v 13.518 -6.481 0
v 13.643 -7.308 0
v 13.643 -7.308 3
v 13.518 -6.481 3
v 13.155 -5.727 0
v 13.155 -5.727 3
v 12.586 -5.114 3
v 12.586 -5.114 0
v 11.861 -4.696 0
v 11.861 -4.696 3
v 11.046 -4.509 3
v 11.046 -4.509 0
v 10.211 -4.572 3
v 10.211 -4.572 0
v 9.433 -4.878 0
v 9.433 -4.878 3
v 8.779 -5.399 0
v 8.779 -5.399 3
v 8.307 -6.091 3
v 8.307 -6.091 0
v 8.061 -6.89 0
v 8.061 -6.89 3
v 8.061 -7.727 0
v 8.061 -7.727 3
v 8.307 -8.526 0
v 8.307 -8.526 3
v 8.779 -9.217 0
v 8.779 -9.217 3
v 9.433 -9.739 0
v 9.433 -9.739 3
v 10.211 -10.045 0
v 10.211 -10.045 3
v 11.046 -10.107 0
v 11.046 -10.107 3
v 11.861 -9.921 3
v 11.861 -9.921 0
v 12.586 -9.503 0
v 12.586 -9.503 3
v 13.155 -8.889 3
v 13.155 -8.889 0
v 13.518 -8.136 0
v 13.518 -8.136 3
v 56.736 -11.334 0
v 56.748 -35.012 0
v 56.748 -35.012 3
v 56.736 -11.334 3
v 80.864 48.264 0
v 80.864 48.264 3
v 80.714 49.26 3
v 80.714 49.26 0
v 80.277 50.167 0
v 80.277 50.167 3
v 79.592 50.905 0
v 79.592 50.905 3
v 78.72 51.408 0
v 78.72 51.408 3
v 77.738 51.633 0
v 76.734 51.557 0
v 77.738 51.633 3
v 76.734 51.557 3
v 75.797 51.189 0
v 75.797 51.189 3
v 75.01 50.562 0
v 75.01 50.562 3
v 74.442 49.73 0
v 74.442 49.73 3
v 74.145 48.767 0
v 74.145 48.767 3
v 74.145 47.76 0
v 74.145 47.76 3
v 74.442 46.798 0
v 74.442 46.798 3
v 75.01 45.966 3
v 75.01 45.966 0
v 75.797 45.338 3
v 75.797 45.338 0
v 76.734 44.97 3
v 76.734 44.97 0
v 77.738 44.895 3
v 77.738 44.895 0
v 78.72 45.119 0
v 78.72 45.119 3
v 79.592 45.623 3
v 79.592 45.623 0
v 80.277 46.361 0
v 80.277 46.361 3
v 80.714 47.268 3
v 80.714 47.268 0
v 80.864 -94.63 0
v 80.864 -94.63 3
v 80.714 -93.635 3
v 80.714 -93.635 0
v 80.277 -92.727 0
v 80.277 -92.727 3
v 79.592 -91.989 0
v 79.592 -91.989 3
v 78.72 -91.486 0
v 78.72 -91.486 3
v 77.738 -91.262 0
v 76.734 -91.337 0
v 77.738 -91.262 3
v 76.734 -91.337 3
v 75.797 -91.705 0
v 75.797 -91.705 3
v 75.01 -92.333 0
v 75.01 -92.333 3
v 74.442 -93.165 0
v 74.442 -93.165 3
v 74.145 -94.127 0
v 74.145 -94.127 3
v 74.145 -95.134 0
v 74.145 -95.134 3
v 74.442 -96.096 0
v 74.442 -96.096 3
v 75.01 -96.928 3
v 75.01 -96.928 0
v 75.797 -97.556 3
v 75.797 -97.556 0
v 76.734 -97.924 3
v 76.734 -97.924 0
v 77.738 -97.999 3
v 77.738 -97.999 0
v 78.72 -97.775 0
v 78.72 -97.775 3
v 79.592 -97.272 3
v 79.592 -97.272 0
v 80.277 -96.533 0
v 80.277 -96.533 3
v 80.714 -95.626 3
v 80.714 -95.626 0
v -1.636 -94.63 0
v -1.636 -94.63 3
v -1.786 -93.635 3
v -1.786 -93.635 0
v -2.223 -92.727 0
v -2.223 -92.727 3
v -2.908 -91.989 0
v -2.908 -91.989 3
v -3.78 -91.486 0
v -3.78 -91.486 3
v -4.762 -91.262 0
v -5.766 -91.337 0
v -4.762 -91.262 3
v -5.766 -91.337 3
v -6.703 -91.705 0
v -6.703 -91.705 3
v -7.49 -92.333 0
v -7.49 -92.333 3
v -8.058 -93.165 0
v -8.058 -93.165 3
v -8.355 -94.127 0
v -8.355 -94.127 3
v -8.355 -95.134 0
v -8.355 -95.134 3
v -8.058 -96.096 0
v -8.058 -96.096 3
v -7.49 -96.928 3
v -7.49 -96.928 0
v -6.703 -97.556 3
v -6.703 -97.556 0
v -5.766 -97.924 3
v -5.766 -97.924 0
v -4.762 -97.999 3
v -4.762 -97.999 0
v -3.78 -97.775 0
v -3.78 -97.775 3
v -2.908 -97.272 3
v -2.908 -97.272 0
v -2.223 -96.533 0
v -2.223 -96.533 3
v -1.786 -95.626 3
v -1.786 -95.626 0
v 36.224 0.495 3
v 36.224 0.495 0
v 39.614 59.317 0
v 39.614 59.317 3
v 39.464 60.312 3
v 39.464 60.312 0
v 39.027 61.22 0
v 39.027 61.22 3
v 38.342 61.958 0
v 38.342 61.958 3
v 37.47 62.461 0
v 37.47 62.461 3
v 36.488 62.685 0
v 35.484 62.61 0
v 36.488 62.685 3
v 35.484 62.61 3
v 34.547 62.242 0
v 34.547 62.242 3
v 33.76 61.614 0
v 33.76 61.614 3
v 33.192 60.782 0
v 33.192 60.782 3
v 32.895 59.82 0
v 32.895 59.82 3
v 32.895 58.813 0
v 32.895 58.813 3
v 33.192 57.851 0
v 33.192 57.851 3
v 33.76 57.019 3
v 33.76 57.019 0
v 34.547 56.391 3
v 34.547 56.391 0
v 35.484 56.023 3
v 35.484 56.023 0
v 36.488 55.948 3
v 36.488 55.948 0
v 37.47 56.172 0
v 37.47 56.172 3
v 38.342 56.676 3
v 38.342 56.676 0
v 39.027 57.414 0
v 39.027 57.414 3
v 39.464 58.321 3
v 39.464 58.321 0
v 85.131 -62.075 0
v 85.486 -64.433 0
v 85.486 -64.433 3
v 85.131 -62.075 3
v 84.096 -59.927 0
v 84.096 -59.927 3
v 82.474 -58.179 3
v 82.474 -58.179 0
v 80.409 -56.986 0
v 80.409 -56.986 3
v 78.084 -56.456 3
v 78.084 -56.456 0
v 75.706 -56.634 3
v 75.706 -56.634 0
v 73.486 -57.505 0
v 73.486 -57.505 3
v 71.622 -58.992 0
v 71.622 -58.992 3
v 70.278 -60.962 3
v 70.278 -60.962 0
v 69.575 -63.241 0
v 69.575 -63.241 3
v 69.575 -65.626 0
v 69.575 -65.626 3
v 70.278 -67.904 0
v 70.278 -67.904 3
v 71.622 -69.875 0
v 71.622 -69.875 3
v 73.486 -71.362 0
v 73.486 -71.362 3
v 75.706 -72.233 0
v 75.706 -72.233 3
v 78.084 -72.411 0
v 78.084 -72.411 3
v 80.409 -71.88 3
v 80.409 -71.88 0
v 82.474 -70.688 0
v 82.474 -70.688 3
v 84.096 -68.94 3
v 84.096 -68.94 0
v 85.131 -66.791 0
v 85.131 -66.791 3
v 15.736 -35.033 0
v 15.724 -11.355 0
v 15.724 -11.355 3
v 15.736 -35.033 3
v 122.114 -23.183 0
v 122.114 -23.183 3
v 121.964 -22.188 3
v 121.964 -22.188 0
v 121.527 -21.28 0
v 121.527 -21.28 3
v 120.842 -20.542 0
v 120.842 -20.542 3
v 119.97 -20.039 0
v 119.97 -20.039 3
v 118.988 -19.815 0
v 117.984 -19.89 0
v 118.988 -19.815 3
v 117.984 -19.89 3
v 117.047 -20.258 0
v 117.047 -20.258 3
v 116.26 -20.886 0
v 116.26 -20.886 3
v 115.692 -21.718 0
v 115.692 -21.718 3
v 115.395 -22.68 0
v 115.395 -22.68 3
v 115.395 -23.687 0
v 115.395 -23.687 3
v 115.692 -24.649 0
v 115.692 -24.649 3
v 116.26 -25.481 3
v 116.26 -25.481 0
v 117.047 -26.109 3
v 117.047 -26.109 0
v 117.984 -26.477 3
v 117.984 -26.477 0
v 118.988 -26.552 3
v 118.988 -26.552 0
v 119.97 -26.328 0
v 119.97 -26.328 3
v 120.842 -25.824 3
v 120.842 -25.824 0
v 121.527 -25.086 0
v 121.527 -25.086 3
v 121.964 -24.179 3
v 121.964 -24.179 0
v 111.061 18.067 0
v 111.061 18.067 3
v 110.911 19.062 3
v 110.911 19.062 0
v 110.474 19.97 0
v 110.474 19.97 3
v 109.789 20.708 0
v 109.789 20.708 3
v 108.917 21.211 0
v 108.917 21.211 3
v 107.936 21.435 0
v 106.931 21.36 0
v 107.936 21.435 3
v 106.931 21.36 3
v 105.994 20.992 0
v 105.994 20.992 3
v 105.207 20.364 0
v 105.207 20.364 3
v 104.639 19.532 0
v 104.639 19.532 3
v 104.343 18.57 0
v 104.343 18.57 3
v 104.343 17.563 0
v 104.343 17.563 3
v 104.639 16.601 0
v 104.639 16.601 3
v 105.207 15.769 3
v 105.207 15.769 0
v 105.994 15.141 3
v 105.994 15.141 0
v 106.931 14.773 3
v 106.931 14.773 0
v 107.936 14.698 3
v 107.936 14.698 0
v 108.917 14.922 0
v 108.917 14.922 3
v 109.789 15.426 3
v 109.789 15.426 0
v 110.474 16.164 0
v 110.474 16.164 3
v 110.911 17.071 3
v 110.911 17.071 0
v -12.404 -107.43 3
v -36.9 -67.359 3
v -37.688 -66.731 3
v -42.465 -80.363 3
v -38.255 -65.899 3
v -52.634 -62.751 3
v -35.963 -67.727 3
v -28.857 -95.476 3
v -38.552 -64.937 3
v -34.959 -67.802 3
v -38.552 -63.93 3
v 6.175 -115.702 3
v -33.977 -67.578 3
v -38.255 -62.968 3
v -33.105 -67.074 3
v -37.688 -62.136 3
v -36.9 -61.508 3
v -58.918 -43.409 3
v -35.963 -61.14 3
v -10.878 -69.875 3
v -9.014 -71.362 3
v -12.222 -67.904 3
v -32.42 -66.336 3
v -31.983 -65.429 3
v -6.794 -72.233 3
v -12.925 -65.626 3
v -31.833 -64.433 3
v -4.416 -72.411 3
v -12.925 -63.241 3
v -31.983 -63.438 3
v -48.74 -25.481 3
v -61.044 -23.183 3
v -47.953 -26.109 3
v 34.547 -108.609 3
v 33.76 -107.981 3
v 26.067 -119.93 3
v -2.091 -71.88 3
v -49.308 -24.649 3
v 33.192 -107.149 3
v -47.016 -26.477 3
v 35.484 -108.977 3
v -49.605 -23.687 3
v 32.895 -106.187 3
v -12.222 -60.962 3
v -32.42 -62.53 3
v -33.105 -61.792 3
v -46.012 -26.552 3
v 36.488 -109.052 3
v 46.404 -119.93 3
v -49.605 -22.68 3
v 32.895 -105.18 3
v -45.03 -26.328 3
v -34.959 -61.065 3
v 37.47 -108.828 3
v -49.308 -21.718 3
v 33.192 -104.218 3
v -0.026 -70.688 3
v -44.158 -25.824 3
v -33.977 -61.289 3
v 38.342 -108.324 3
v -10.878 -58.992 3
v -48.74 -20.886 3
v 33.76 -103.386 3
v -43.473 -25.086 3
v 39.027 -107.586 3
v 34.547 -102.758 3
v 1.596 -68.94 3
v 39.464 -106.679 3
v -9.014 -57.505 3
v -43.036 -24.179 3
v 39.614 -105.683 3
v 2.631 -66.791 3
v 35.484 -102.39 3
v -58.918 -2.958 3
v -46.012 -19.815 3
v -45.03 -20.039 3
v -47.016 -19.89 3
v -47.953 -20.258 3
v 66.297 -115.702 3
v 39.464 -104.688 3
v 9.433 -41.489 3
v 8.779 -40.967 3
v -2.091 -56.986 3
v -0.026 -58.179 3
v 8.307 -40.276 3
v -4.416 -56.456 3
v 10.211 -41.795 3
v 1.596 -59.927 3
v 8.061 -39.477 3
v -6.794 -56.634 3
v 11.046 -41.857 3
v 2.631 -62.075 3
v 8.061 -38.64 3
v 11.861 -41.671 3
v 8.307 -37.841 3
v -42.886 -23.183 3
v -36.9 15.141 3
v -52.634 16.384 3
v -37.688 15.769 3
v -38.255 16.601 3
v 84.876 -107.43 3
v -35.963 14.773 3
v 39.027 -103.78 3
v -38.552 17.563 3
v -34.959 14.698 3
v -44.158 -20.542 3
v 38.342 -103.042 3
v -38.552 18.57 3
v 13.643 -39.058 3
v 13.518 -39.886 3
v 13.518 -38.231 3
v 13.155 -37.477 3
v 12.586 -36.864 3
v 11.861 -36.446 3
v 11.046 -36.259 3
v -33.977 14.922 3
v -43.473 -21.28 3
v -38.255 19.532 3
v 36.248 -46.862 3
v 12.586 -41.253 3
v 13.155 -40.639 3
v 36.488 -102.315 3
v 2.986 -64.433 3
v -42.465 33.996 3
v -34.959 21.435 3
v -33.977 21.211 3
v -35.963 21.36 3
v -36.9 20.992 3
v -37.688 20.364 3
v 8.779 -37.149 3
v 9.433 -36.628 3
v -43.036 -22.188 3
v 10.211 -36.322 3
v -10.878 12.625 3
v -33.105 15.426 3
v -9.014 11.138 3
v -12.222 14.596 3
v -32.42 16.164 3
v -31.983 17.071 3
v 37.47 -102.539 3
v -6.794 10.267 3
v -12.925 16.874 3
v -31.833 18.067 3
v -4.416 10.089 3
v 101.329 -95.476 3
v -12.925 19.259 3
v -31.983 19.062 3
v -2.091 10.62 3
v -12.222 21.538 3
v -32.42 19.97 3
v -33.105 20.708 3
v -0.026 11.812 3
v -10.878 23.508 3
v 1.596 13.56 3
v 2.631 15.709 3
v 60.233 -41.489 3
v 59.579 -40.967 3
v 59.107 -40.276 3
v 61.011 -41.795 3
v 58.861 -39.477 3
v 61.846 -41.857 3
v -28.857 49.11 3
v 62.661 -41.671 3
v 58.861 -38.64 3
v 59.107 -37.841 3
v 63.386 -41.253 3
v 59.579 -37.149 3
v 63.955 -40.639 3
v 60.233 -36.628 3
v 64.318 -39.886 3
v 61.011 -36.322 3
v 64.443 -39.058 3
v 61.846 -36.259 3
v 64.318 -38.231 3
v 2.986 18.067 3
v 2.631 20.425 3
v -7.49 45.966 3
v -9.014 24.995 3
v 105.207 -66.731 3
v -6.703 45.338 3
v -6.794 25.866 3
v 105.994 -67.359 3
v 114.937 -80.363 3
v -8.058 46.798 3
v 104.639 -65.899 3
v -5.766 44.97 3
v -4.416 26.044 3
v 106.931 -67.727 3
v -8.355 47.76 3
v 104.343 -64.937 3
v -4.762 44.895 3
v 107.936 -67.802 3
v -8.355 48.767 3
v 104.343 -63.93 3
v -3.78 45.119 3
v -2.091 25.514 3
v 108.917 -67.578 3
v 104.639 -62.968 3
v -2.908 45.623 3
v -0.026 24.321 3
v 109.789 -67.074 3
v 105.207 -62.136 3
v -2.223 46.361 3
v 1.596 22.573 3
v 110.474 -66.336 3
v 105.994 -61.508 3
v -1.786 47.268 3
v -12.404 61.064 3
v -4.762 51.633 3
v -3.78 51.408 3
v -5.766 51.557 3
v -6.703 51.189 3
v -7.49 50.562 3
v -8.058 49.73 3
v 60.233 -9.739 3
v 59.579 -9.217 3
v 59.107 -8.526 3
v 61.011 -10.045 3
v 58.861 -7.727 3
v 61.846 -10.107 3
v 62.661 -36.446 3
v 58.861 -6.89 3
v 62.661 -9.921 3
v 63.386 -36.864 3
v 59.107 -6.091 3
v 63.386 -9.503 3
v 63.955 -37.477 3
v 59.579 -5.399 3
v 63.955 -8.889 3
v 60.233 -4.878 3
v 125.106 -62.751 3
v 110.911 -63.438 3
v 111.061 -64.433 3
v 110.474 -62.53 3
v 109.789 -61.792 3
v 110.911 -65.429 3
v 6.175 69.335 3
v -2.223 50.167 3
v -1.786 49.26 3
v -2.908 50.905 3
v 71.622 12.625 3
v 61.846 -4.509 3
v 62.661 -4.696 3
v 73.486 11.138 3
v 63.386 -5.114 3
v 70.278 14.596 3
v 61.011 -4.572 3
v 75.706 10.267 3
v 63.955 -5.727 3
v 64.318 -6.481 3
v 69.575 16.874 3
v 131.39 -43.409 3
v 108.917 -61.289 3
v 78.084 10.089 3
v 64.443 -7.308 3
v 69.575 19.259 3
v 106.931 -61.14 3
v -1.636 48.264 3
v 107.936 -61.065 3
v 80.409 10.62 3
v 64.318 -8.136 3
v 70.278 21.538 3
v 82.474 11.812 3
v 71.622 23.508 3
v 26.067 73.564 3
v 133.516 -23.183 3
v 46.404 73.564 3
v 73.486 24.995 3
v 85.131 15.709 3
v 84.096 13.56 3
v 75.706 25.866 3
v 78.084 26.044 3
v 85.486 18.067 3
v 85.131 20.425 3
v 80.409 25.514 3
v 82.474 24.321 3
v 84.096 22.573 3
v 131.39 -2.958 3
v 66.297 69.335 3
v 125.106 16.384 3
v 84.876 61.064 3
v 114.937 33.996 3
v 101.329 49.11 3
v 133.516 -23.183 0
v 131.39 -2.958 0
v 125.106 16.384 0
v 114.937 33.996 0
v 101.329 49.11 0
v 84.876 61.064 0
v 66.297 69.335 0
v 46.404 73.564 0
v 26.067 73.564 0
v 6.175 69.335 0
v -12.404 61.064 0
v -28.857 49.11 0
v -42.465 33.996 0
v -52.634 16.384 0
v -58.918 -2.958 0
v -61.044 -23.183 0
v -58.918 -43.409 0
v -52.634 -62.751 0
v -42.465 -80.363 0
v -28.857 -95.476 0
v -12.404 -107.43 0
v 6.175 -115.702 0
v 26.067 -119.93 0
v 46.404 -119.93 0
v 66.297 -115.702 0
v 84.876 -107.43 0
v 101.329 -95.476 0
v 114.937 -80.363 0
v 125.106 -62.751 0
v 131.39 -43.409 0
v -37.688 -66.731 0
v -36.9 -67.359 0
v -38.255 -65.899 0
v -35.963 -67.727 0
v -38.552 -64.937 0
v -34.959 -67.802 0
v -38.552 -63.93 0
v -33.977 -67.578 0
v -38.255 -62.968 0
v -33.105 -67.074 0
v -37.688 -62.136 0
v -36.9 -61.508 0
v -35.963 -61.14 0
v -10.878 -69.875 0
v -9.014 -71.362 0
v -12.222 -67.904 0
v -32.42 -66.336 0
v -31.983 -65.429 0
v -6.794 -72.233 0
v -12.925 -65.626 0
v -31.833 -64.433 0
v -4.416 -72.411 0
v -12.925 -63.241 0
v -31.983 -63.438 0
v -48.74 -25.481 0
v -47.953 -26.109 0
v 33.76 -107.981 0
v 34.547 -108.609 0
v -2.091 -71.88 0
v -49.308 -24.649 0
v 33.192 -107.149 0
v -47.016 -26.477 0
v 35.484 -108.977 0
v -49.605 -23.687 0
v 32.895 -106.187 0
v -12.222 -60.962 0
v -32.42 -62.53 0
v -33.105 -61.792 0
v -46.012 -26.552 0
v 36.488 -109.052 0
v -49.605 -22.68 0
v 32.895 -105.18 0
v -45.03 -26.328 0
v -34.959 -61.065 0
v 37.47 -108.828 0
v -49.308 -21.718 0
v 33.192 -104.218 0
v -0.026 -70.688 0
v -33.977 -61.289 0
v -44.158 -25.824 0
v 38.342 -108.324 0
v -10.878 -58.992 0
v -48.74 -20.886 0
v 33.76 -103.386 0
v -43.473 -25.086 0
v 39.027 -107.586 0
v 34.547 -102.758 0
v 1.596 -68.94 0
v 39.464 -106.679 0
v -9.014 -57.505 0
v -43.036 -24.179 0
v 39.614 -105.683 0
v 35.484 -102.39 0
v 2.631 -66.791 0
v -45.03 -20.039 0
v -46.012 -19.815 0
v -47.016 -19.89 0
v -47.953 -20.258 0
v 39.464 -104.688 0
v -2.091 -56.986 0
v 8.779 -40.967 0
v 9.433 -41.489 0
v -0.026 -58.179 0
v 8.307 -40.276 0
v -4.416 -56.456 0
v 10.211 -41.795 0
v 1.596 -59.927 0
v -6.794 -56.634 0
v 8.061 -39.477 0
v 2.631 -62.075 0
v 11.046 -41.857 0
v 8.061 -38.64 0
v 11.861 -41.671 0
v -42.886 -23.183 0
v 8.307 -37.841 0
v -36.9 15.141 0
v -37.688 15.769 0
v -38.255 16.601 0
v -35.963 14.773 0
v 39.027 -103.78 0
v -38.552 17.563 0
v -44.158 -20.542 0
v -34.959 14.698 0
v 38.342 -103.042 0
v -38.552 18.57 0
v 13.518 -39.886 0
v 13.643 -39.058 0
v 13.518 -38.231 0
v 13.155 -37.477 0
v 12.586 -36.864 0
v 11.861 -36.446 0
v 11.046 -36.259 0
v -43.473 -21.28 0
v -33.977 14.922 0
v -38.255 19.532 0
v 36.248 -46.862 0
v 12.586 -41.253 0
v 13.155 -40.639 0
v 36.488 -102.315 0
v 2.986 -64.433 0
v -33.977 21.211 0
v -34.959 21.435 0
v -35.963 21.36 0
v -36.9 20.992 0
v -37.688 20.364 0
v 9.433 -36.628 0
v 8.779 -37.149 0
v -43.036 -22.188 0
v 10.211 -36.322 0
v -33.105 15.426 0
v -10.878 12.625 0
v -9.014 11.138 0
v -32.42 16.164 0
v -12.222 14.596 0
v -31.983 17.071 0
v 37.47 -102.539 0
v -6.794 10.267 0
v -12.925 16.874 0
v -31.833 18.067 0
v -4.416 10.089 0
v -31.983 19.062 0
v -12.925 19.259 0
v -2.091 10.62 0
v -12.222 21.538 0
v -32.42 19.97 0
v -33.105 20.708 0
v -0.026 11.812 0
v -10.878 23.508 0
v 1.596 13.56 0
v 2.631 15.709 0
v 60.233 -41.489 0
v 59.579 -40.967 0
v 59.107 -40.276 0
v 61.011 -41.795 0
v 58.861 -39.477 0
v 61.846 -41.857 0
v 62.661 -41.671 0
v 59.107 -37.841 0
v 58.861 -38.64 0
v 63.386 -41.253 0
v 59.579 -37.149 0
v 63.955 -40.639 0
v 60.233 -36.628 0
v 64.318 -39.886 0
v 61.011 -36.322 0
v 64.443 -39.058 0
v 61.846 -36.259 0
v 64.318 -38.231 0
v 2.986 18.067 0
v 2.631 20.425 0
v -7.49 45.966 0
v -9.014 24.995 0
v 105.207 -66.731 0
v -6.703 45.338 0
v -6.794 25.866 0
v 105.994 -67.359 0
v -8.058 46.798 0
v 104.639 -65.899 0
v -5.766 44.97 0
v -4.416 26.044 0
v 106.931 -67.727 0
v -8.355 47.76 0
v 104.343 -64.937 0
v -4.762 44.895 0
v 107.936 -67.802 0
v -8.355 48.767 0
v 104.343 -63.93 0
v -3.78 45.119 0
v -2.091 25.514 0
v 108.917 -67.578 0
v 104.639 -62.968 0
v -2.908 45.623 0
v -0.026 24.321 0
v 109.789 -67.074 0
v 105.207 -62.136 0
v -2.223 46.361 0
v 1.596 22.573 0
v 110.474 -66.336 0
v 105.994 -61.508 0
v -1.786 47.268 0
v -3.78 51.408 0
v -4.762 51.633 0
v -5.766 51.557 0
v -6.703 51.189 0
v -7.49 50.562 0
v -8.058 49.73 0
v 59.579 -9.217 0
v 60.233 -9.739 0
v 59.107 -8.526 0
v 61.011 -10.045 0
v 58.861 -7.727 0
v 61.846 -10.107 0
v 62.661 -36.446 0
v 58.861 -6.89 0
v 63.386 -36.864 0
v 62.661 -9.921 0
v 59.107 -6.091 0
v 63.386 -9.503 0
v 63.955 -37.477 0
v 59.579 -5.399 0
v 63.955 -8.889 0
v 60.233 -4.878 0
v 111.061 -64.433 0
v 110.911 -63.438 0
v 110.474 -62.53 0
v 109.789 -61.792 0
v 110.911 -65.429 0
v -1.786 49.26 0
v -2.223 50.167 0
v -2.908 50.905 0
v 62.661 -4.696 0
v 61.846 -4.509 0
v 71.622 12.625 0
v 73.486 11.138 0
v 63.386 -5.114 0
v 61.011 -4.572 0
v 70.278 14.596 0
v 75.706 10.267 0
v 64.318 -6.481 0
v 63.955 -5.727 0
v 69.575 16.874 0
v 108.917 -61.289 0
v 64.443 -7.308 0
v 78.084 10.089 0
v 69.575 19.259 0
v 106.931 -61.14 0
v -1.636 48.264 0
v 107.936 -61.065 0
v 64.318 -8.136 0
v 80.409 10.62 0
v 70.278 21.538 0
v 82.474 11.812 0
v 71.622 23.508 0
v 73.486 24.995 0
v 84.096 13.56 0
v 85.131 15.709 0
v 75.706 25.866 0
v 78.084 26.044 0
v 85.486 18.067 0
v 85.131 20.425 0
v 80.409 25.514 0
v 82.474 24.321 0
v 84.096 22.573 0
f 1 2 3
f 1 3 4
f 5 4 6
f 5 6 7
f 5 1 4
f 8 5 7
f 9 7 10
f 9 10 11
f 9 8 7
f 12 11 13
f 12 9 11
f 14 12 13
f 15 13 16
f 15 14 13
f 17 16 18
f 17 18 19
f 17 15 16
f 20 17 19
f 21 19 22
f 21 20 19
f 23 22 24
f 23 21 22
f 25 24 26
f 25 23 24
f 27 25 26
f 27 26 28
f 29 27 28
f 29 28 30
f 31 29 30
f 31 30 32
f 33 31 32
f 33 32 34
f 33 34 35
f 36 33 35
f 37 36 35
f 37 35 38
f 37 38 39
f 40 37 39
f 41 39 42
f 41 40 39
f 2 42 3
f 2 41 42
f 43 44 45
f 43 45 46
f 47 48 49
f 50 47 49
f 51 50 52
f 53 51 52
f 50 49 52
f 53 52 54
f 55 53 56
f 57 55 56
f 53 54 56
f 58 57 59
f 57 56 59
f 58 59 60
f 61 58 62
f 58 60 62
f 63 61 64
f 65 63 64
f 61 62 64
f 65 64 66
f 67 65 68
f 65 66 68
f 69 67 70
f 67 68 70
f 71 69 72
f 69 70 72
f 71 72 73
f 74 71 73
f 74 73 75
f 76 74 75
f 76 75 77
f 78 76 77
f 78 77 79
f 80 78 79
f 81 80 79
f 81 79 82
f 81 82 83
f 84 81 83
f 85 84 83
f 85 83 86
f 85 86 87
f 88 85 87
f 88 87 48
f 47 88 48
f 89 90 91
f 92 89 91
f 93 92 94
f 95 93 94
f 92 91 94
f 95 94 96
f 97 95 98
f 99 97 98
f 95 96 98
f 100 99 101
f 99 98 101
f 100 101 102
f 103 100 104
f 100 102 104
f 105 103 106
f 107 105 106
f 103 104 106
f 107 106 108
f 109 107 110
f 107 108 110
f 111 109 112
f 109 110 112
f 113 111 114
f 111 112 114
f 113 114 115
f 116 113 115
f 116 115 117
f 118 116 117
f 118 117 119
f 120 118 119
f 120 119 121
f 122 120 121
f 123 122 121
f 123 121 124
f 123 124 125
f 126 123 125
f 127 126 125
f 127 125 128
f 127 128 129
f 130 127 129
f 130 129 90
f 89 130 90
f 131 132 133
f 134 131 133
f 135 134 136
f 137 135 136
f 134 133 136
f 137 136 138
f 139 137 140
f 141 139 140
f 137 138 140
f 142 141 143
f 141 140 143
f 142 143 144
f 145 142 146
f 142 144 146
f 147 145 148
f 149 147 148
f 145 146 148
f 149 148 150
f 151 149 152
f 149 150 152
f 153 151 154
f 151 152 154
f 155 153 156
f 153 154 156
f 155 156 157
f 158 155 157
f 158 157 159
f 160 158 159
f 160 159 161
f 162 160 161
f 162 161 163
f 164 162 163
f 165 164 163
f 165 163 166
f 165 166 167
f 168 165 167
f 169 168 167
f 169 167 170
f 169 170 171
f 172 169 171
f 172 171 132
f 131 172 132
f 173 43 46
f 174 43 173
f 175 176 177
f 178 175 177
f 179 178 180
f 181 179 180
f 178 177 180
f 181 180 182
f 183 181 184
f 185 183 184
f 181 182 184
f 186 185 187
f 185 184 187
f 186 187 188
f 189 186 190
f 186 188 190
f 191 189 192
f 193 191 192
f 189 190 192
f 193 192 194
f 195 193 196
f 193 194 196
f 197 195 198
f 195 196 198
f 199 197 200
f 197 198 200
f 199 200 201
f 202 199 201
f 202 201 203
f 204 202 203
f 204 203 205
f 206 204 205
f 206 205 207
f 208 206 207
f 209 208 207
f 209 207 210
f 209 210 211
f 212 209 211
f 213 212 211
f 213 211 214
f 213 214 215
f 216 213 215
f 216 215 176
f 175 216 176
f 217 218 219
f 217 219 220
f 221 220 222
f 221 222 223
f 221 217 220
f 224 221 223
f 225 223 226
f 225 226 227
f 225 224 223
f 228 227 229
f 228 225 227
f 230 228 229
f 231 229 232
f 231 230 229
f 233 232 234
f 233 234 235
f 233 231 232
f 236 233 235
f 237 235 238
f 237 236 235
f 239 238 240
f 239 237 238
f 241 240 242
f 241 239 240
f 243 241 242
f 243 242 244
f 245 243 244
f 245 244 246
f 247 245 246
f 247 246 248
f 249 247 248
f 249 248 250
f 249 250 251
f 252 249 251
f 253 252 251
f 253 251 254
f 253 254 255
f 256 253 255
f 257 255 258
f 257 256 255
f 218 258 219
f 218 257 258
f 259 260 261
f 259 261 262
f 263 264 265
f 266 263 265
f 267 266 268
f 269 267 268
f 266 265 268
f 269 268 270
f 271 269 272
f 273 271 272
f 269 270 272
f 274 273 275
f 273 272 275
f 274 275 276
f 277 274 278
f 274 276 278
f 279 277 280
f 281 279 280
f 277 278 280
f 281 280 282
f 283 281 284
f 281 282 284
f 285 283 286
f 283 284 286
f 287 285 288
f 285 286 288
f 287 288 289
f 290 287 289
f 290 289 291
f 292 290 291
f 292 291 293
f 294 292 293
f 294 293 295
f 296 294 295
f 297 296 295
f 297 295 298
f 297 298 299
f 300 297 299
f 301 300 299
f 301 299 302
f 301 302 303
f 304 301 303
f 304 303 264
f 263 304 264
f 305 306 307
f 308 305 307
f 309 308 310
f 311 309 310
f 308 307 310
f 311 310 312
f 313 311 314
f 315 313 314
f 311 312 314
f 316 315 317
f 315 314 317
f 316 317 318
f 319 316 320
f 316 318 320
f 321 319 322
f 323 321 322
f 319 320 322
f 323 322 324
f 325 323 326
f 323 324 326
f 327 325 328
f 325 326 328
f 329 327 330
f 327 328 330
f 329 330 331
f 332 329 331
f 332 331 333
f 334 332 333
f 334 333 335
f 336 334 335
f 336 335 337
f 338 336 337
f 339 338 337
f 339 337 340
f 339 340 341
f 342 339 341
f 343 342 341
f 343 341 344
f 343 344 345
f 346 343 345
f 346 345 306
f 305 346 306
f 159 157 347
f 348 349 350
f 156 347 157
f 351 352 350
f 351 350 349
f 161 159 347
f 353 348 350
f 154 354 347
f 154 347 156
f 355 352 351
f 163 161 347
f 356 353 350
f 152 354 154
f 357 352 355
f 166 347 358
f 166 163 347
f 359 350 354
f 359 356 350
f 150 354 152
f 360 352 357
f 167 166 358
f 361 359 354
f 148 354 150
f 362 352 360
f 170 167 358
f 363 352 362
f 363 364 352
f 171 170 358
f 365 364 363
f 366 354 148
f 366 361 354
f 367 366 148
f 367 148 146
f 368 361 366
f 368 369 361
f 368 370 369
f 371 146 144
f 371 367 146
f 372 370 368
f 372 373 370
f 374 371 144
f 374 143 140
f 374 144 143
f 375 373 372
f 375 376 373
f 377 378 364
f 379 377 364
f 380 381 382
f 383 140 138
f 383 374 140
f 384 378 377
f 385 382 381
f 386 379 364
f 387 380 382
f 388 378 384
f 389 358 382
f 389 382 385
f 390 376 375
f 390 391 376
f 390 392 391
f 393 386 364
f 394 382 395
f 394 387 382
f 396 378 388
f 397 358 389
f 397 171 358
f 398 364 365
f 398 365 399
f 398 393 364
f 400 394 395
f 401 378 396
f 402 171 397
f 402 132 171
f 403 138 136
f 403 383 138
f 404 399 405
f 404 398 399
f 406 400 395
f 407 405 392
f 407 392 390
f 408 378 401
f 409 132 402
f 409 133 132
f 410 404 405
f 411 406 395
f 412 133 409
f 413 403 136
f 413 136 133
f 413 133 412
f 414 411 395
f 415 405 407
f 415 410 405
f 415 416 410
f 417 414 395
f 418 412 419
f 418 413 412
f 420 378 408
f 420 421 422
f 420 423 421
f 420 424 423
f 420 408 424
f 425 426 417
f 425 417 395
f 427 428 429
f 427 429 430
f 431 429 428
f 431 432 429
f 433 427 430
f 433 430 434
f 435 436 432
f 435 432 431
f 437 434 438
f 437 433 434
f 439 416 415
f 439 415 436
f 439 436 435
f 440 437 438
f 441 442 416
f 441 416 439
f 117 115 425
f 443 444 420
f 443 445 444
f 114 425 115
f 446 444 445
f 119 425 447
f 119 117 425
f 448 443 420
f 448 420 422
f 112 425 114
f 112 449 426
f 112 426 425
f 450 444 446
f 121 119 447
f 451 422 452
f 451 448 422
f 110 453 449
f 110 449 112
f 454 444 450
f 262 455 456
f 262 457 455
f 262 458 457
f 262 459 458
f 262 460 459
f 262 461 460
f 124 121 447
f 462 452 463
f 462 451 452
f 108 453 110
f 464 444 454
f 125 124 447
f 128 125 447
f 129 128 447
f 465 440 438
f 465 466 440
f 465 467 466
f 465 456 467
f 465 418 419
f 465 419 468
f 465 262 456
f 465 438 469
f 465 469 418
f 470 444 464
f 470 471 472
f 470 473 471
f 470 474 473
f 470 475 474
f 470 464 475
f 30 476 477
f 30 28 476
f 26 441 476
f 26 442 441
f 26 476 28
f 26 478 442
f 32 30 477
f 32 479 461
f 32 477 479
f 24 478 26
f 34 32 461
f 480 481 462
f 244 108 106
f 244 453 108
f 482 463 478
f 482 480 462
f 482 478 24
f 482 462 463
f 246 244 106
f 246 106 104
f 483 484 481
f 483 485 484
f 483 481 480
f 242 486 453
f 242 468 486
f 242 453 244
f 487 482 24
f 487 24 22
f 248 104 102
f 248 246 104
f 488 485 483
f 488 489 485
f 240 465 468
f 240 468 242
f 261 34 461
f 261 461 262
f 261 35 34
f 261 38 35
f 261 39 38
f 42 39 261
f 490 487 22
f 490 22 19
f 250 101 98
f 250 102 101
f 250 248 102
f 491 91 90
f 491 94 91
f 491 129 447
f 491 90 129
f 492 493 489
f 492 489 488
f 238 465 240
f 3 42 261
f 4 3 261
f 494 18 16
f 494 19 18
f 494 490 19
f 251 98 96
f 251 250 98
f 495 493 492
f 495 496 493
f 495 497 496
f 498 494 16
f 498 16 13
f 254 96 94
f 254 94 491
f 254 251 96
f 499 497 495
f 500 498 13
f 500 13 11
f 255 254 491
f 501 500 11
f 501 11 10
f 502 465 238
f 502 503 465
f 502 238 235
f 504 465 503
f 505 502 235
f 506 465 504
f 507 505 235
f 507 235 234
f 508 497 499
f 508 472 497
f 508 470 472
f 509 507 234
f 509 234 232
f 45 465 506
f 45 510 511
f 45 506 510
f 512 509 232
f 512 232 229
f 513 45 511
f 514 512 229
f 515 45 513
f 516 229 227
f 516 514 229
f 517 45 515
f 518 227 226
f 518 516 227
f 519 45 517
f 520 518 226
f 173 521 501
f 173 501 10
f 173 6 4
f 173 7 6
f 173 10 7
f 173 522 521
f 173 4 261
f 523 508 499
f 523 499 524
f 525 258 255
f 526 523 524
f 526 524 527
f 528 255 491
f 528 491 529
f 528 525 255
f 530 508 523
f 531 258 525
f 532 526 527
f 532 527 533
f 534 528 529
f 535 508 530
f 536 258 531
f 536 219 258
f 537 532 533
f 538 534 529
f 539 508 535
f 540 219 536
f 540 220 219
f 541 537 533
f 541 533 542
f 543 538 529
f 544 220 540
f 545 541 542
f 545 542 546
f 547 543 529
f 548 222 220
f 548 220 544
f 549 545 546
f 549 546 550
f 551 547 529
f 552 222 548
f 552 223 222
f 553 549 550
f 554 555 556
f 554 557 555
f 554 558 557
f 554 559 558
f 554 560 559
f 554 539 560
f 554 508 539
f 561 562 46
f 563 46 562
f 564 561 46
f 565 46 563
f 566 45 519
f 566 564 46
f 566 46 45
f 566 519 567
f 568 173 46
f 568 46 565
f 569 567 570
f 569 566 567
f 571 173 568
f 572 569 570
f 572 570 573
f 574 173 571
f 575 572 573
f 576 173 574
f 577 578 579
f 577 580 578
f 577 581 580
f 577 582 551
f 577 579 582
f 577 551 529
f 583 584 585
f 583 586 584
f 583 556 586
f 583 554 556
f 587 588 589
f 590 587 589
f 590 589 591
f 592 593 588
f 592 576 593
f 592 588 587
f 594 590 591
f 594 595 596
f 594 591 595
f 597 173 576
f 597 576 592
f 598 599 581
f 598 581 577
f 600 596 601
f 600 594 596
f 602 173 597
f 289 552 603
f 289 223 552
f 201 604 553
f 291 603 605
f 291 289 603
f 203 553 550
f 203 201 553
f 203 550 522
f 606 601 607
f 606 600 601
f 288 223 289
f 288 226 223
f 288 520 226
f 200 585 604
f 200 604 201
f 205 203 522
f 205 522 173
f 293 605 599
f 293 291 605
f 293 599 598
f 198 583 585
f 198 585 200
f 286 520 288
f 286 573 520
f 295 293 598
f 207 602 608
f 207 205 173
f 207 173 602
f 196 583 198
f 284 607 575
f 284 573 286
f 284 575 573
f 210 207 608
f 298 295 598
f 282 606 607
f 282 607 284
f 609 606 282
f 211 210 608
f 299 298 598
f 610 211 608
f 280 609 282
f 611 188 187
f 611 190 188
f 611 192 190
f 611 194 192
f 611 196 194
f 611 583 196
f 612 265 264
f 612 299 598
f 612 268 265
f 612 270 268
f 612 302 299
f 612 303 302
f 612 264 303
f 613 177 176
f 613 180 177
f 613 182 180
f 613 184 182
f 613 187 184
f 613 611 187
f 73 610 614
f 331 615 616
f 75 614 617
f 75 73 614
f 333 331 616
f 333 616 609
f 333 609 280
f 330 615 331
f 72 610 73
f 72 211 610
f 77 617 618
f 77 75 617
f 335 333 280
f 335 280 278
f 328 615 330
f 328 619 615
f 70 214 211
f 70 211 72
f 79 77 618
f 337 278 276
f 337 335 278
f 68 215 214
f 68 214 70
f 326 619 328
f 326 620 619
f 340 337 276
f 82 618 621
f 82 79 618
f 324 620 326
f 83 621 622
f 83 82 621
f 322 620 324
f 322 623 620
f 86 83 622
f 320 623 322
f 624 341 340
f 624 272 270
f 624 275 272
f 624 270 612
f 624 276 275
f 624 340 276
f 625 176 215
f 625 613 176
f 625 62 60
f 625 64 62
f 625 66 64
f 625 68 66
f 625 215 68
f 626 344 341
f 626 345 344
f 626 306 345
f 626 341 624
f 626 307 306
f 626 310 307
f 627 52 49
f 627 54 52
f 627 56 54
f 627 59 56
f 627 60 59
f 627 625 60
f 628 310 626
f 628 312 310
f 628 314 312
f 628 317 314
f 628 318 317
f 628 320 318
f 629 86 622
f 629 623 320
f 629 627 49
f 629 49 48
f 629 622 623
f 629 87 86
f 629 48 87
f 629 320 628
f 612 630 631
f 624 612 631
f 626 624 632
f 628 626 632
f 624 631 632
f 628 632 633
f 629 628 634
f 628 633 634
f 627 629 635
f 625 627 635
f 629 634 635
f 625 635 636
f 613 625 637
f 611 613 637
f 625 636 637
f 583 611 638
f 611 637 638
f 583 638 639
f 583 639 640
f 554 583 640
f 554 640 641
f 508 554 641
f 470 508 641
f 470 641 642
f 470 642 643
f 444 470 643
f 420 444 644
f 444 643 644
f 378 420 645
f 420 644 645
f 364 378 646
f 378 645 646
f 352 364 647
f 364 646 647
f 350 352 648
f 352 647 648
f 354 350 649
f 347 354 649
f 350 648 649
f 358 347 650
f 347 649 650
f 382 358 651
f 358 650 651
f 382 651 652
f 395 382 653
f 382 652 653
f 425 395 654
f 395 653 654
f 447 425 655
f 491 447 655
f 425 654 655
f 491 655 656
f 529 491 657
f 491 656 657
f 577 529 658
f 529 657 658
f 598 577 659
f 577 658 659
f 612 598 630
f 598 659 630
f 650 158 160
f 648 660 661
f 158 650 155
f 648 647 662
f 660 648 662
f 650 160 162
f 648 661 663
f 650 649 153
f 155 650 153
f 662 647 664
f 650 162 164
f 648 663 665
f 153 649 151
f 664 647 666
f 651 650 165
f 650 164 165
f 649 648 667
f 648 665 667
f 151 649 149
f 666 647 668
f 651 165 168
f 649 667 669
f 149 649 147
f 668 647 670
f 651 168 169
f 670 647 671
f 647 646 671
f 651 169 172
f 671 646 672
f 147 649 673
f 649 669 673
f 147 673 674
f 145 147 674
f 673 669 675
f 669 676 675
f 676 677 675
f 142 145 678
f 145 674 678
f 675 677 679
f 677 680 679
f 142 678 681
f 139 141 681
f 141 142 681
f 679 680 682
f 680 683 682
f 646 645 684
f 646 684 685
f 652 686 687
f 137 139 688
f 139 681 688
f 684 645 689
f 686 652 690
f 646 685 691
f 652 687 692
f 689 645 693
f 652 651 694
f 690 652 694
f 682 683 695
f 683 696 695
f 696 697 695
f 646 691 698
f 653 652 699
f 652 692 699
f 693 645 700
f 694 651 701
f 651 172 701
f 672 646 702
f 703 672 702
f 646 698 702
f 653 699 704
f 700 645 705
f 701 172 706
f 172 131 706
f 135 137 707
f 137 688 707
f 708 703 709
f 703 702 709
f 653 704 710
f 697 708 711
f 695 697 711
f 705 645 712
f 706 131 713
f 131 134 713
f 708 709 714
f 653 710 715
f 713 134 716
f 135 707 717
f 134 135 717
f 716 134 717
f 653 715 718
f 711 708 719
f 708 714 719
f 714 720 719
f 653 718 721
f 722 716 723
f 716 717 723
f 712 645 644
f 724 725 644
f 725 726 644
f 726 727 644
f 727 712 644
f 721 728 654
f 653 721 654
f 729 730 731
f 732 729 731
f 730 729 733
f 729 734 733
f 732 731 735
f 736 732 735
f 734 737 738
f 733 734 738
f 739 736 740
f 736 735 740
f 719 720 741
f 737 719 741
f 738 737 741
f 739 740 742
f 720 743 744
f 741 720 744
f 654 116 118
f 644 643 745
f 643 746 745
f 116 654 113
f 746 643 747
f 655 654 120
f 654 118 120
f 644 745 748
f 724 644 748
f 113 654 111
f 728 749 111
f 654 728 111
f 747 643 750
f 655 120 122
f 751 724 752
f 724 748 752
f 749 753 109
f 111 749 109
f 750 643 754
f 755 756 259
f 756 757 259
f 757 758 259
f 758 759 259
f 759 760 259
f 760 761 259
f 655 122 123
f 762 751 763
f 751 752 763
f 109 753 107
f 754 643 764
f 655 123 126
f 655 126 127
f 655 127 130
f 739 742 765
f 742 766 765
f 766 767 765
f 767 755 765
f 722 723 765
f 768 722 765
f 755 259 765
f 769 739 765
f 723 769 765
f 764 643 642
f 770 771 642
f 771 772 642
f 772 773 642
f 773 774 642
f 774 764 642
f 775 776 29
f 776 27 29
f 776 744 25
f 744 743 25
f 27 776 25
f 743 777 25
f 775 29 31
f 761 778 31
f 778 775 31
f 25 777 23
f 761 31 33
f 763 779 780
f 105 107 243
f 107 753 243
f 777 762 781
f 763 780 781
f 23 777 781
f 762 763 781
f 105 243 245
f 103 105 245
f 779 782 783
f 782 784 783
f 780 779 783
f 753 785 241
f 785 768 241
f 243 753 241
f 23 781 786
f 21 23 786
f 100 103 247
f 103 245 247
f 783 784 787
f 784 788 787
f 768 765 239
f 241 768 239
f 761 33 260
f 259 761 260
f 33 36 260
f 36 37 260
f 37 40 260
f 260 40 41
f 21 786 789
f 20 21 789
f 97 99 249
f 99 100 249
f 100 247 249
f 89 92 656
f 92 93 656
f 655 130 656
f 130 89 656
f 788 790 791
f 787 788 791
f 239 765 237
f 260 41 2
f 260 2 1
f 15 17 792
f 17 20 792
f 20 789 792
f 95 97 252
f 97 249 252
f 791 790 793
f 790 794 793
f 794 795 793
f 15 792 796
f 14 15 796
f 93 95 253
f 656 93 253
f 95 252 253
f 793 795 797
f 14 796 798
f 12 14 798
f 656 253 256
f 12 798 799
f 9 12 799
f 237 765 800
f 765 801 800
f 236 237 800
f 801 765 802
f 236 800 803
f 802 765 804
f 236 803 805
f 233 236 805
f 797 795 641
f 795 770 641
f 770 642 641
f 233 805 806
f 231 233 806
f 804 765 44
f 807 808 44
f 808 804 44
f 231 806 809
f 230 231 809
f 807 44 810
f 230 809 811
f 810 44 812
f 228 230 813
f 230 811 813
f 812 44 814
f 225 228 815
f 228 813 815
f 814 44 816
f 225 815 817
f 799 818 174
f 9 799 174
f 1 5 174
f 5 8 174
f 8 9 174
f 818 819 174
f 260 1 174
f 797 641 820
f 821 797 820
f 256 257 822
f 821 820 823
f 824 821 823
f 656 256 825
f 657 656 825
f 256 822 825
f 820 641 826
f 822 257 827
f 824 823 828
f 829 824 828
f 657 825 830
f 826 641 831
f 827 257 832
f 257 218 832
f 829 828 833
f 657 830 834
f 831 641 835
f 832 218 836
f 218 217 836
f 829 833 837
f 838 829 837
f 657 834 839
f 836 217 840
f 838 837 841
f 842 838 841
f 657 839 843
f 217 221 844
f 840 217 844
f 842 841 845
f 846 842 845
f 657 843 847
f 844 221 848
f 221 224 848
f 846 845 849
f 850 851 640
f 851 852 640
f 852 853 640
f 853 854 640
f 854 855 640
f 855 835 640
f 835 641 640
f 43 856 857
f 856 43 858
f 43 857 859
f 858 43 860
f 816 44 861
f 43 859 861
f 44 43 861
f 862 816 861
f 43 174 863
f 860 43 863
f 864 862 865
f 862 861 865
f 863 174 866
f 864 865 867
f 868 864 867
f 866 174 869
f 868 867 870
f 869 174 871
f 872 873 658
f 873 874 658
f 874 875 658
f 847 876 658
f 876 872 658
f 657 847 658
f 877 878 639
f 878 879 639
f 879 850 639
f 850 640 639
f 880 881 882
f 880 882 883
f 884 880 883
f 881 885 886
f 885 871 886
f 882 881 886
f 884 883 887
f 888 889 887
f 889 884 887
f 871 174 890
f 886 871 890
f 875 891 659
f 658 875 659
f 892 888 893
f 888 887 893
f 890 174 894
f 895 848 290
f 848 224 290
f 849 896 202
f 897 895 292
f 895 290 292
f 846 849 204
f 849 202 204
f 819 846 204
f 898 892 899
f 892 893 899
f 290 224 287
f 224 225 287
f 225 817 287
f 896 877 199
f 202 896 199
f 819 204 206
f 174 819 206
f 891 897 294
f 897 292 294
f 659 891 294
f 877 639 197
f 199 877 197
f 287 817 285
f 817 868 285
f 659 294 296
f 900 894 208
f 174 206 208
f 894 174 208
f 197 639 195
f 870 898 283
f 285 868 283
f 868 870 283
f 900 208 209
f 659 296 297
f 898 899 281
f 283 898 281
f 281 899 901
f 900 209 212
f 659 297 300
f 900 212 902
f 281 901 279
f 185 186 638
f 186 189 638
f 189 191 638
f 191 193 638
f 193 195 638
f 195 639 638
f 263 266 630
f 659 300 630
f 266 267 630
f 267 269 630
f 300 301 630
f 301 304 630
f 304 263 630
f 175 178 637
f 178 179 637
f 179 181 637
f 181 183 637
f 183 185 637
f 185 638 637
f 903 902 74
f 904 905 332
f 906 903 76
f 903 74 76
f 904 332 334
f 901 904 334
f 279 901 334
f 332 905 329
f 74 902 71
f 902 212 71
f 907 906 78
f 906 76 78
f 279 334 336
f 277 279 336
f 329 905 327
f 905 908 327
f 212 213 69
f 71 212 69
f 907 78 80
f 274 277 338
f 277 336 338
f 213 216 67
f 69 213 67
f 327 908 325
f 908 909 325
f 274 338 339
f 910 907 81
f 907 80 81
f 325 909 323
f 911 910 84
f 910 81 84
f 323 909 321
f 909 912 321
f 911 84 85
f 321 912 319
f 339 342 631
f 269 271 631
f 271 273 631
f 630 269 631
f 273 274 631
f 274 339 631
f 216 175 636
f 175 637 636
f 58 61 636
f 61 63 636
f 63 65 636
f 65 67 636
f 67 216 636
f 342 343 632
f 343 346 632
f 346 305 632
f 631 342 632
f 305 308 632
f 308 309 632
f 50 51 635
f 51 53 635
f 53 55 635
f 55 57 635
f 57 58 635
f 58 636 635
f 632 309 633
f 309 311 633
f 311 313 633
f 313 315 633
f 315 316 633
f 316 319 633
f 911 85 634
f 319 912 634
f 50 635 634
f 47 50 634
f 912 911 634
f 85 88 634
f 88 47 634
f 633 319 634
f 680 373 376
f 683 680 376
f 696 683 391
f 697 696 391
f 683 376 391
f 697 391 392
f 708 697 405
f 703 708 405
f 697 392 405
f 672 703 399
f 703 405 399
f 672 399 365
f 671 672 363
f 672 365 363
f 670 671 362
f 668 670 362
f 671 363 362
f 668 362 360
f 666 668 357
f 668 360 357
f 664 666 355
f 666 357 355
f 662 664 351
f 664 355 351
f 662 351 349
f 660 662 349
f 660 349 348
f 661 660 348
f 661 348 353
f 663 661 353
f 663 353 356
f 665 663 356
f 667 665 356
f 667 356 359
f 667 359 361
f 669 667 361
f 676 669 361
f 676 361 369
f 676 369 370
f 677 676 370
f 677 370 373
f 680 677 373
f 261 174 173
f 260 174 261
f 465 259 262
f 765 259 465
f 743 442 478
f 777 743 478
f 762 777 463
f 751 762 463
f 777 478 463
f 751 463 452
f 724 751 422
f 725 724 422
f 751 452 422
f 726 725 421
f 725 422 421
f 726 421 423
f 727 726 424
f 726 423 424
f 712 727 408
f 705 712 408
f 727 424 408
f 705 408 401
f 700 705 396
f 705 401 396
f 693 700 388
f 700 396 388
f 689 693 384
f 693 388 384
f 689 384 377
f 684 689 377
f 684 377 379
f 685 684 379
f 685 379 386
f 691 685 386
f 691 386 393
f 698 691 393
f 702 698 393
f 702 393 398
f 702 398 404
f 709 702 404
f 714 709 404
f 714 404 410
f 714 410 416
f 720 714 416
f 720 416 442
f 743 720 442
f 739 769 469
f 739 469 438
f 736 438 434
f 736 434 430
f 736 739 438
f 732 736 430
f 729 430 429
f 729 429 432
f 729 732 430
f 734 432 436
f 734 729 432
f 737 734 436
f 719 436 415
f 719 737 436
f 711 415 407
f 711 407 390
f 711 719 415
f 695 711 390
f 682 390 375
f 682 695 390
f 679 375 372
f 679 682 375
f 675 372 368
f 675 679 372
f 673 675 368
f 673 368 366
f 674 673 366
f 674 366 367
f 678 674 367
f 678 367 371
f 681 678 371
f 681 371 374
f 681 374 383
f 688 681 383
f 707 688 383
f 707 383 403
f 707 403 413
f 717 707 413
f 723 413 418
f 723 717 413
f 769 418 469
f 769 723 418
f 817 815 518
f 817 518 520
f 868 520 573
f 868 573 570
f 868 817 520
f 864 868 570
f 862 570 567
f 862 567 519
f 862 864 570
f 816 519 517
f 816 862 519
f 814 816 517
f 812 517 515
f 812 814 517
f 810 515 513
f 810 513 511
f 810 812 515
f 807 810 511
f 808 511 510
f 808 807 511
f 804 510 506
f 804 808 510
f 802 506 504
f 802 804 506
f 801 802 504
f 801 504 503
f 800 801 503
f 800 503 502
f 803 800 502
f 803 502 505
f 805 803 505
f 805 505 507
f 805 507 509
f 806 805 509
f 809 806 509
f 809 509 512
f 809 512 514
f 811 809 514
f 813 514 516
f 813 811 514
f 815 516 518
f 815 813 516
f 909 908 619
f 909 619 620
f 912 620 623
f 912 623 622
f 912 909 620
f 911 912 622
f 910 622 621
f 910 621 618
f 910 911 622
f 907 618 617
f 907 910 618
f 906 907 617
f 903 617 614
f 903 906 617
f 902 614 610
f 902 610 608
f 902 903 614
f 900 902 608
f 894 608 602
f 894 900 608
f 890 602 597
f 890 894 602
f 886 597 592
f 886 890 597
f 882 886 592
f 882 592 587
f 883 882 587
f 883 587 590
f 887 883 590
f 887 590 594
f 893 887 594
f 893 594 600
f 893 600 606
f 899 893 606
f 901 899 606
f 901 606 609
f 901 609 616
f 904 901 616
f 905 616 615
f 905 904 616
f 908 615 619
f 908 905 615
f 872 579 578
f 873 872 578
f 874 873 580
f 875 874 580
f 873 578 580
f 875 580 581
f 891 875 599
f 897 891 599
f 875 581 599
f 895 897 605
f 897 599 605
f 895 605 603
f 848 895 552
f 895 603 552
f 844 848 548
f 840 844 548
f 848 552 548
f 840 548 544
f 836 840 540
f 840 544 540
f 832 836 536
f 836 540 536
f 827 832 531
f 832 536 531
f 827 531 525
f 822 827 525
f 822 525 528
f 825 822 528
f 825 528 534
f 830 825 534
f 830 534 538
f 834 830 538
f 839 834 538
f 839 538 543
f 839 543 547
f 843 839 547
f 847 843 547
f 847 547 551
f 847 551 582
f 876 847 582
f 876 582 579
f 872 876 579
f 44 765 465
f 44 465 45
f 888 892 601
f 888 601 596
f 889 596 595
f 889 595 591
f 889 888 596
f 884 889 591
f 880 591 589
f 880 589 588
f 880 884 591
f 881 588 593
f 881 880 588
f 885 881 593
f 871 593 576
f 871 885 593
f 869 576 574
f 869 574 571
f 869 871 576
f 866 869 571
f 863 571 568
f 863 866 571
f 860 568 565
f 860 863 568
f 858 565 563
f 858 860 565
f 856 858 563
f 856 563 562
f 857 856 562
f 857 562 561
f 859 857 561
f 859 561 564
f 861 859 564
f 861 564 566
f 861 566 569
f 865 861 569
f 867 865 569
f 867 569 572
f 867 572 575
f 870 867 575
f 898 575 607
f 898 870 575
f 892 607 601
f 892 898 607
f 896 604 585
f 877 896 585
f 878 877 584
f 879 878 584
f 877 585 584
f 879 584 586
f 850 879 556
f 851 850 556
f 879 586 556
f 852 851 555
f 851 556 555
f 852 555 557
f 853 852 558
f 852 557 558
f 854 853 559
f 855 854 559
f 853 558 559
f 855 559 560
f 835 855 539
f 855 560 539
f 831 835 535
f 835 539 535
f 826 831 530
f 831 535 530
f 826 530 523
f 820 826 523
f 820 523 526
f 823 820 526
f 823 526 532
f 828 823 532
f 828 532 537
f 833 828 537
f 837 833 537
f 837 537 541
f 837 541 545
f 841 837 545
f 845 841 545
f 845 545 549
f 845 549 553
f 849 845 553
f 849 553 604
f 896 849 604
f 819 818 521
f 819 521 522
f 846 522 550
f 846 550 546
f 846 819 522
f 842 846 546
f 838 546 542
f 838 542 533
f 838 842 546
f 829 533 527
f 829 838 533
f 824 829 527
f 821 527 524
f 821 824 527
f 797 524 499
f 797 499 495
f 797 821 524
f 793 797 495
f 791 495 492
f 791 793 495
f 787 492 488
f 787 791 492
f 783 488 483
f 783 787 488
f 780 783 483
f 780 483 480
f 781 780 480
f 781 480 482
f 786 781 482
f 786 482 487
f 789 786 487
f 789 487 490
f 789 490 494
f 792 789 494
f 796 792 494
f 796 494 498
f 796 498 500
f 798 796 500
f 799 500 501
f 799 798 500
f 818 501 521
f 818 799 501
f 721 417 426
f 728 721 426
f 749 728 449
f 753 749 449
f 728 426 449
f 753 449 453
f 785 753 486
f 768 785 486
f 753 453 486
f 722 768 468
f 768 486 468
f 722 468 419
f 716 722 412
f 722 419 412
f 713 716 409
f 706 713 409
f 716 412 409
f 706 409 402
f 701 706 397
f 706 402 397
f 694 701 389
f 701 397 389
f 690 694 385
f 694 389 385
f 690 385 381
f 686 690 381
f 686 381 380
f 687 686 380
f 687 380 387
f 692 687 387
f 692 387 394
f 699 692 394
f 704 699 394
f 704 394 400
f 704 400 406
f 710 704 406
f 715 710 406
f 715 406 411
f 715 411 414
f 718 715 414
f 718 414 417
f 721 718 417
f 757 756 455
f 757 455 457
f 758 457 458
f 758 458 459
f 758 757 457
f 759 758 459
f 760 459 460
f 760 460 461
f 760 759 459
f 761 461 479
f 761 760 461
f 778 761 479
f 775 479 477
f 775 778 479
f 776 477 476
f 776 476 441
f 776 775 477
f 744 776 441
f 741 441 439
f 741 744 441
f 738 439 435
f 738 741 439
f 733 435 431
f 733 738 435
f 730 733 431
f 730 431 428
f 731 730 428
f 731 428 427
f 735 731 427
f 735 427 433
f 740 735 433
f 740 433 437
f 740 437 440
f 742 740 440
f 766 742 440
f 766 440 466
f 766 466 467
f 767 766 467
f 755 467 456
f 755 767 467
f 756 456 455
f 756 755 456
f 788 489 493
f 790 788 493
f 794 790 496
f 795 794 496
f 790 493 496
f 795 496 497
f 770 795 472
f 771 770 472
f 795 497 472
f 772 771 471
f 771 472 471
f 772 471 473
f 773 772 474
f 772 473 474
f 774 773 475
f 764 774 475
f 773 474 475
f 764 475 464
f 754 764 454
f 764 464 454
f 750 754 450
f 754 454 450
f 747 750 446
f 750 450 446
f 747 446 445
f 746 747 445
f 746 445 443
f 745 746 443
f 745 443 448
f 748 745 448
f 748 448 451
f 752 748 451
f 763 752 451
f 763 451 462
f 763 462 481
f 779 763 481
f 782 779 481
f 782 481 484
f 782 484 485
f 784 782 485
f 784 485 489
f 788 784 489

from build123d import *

# Parameters (mm, degrees)
SKETCH1_R               = 97.28
SKETCH1_R_2             = 2.8067
SKETCH1_R_3             = 8
BOSS_EXTRUDE1_DEPTH     = 3
F_1_4_CLEARANCE_HOLE1_D = 6.7564


with BuildPart() as part:
    # Sketch1 → Boss-Extrude1 (new body)
    with BuildSketch(Plane.XY):
        with Locations((36.235962131, -23.183312097)):
            Circle(SKETCH1_R)
        with Locations((61.635962131, -7.308312097)):
            Circle(SKETCH1_R_2, mode=Mode.SUBTRACT)
        with Locations((61.635962131, -39.058312097)):
            Circle(SKETCH1_R_2, mode=Mode.SUBTRACT)
        with Locations((10.835962131, -39.058312097)):
            Circle(SKETCH1_R_2, mode=Mode.SUBTRACT)
        with Locations((10.835962131, -7.308312097)):
            Circle(SKETCH1_R_2, mode=Mode.SUBTRACT)
        with Locations((-5.014037869, -64.433312097)):
            Circle(SKETCH1_R_3, mode=Mode.SUBTRACT)
        with Locations((77.485962131, -64.433312097)):
            Circle(SKETCH1_R_3, mode=Mode.SUBTRACT)
        with Locations((77.485962131, 18.066687903)):
            Circle(SKETCH1_R_3, mode=Mode.SUBTRACT)
        with Locations((-5.014037869, 18.066687903)):
            Circle(SKETCH1_R_3, mode=Mode.SUBTRACT)
        Polygon((15.735962131, -35.032829738), (36.247945431, -46.861591696), (56.747945431, -35.012074055), (56.735962131, -11.333794456), (36.223978831, 0.494967501), (15.723978831, -11.35455014), align=None, mode=Mode.SUBTRACT)
    extrude(amount=BOSS_EXTRUDE1_DEPTH)

    # 1/4 Clearance Hole1 (through all)
    with Locations(Plane(origin=(0, 0, 0), x_dir=(-1, 0, 0), z_dir=(0, 0, -1))):
        with Locations((-118.735962131, -23.183312097), (-107.683057943, -64.433312097), (46.264037869, -23.183312097), (35.211133681, -64.433312097), (-77.485962131, -94.63040791), (-36.235962131, -105.683312097), (5.014037869, -94.63040791), (35.211133681, 18.066687903), (5.014037869, 48.263783715), (-36.235962131, 59.316687903), (-77.485962131, 48.263783715), (-107.683057943, 18.066687903)):
            Hole(F_1_4_CLEARANCE_HOLE1_D / 2)


solid = part.part
